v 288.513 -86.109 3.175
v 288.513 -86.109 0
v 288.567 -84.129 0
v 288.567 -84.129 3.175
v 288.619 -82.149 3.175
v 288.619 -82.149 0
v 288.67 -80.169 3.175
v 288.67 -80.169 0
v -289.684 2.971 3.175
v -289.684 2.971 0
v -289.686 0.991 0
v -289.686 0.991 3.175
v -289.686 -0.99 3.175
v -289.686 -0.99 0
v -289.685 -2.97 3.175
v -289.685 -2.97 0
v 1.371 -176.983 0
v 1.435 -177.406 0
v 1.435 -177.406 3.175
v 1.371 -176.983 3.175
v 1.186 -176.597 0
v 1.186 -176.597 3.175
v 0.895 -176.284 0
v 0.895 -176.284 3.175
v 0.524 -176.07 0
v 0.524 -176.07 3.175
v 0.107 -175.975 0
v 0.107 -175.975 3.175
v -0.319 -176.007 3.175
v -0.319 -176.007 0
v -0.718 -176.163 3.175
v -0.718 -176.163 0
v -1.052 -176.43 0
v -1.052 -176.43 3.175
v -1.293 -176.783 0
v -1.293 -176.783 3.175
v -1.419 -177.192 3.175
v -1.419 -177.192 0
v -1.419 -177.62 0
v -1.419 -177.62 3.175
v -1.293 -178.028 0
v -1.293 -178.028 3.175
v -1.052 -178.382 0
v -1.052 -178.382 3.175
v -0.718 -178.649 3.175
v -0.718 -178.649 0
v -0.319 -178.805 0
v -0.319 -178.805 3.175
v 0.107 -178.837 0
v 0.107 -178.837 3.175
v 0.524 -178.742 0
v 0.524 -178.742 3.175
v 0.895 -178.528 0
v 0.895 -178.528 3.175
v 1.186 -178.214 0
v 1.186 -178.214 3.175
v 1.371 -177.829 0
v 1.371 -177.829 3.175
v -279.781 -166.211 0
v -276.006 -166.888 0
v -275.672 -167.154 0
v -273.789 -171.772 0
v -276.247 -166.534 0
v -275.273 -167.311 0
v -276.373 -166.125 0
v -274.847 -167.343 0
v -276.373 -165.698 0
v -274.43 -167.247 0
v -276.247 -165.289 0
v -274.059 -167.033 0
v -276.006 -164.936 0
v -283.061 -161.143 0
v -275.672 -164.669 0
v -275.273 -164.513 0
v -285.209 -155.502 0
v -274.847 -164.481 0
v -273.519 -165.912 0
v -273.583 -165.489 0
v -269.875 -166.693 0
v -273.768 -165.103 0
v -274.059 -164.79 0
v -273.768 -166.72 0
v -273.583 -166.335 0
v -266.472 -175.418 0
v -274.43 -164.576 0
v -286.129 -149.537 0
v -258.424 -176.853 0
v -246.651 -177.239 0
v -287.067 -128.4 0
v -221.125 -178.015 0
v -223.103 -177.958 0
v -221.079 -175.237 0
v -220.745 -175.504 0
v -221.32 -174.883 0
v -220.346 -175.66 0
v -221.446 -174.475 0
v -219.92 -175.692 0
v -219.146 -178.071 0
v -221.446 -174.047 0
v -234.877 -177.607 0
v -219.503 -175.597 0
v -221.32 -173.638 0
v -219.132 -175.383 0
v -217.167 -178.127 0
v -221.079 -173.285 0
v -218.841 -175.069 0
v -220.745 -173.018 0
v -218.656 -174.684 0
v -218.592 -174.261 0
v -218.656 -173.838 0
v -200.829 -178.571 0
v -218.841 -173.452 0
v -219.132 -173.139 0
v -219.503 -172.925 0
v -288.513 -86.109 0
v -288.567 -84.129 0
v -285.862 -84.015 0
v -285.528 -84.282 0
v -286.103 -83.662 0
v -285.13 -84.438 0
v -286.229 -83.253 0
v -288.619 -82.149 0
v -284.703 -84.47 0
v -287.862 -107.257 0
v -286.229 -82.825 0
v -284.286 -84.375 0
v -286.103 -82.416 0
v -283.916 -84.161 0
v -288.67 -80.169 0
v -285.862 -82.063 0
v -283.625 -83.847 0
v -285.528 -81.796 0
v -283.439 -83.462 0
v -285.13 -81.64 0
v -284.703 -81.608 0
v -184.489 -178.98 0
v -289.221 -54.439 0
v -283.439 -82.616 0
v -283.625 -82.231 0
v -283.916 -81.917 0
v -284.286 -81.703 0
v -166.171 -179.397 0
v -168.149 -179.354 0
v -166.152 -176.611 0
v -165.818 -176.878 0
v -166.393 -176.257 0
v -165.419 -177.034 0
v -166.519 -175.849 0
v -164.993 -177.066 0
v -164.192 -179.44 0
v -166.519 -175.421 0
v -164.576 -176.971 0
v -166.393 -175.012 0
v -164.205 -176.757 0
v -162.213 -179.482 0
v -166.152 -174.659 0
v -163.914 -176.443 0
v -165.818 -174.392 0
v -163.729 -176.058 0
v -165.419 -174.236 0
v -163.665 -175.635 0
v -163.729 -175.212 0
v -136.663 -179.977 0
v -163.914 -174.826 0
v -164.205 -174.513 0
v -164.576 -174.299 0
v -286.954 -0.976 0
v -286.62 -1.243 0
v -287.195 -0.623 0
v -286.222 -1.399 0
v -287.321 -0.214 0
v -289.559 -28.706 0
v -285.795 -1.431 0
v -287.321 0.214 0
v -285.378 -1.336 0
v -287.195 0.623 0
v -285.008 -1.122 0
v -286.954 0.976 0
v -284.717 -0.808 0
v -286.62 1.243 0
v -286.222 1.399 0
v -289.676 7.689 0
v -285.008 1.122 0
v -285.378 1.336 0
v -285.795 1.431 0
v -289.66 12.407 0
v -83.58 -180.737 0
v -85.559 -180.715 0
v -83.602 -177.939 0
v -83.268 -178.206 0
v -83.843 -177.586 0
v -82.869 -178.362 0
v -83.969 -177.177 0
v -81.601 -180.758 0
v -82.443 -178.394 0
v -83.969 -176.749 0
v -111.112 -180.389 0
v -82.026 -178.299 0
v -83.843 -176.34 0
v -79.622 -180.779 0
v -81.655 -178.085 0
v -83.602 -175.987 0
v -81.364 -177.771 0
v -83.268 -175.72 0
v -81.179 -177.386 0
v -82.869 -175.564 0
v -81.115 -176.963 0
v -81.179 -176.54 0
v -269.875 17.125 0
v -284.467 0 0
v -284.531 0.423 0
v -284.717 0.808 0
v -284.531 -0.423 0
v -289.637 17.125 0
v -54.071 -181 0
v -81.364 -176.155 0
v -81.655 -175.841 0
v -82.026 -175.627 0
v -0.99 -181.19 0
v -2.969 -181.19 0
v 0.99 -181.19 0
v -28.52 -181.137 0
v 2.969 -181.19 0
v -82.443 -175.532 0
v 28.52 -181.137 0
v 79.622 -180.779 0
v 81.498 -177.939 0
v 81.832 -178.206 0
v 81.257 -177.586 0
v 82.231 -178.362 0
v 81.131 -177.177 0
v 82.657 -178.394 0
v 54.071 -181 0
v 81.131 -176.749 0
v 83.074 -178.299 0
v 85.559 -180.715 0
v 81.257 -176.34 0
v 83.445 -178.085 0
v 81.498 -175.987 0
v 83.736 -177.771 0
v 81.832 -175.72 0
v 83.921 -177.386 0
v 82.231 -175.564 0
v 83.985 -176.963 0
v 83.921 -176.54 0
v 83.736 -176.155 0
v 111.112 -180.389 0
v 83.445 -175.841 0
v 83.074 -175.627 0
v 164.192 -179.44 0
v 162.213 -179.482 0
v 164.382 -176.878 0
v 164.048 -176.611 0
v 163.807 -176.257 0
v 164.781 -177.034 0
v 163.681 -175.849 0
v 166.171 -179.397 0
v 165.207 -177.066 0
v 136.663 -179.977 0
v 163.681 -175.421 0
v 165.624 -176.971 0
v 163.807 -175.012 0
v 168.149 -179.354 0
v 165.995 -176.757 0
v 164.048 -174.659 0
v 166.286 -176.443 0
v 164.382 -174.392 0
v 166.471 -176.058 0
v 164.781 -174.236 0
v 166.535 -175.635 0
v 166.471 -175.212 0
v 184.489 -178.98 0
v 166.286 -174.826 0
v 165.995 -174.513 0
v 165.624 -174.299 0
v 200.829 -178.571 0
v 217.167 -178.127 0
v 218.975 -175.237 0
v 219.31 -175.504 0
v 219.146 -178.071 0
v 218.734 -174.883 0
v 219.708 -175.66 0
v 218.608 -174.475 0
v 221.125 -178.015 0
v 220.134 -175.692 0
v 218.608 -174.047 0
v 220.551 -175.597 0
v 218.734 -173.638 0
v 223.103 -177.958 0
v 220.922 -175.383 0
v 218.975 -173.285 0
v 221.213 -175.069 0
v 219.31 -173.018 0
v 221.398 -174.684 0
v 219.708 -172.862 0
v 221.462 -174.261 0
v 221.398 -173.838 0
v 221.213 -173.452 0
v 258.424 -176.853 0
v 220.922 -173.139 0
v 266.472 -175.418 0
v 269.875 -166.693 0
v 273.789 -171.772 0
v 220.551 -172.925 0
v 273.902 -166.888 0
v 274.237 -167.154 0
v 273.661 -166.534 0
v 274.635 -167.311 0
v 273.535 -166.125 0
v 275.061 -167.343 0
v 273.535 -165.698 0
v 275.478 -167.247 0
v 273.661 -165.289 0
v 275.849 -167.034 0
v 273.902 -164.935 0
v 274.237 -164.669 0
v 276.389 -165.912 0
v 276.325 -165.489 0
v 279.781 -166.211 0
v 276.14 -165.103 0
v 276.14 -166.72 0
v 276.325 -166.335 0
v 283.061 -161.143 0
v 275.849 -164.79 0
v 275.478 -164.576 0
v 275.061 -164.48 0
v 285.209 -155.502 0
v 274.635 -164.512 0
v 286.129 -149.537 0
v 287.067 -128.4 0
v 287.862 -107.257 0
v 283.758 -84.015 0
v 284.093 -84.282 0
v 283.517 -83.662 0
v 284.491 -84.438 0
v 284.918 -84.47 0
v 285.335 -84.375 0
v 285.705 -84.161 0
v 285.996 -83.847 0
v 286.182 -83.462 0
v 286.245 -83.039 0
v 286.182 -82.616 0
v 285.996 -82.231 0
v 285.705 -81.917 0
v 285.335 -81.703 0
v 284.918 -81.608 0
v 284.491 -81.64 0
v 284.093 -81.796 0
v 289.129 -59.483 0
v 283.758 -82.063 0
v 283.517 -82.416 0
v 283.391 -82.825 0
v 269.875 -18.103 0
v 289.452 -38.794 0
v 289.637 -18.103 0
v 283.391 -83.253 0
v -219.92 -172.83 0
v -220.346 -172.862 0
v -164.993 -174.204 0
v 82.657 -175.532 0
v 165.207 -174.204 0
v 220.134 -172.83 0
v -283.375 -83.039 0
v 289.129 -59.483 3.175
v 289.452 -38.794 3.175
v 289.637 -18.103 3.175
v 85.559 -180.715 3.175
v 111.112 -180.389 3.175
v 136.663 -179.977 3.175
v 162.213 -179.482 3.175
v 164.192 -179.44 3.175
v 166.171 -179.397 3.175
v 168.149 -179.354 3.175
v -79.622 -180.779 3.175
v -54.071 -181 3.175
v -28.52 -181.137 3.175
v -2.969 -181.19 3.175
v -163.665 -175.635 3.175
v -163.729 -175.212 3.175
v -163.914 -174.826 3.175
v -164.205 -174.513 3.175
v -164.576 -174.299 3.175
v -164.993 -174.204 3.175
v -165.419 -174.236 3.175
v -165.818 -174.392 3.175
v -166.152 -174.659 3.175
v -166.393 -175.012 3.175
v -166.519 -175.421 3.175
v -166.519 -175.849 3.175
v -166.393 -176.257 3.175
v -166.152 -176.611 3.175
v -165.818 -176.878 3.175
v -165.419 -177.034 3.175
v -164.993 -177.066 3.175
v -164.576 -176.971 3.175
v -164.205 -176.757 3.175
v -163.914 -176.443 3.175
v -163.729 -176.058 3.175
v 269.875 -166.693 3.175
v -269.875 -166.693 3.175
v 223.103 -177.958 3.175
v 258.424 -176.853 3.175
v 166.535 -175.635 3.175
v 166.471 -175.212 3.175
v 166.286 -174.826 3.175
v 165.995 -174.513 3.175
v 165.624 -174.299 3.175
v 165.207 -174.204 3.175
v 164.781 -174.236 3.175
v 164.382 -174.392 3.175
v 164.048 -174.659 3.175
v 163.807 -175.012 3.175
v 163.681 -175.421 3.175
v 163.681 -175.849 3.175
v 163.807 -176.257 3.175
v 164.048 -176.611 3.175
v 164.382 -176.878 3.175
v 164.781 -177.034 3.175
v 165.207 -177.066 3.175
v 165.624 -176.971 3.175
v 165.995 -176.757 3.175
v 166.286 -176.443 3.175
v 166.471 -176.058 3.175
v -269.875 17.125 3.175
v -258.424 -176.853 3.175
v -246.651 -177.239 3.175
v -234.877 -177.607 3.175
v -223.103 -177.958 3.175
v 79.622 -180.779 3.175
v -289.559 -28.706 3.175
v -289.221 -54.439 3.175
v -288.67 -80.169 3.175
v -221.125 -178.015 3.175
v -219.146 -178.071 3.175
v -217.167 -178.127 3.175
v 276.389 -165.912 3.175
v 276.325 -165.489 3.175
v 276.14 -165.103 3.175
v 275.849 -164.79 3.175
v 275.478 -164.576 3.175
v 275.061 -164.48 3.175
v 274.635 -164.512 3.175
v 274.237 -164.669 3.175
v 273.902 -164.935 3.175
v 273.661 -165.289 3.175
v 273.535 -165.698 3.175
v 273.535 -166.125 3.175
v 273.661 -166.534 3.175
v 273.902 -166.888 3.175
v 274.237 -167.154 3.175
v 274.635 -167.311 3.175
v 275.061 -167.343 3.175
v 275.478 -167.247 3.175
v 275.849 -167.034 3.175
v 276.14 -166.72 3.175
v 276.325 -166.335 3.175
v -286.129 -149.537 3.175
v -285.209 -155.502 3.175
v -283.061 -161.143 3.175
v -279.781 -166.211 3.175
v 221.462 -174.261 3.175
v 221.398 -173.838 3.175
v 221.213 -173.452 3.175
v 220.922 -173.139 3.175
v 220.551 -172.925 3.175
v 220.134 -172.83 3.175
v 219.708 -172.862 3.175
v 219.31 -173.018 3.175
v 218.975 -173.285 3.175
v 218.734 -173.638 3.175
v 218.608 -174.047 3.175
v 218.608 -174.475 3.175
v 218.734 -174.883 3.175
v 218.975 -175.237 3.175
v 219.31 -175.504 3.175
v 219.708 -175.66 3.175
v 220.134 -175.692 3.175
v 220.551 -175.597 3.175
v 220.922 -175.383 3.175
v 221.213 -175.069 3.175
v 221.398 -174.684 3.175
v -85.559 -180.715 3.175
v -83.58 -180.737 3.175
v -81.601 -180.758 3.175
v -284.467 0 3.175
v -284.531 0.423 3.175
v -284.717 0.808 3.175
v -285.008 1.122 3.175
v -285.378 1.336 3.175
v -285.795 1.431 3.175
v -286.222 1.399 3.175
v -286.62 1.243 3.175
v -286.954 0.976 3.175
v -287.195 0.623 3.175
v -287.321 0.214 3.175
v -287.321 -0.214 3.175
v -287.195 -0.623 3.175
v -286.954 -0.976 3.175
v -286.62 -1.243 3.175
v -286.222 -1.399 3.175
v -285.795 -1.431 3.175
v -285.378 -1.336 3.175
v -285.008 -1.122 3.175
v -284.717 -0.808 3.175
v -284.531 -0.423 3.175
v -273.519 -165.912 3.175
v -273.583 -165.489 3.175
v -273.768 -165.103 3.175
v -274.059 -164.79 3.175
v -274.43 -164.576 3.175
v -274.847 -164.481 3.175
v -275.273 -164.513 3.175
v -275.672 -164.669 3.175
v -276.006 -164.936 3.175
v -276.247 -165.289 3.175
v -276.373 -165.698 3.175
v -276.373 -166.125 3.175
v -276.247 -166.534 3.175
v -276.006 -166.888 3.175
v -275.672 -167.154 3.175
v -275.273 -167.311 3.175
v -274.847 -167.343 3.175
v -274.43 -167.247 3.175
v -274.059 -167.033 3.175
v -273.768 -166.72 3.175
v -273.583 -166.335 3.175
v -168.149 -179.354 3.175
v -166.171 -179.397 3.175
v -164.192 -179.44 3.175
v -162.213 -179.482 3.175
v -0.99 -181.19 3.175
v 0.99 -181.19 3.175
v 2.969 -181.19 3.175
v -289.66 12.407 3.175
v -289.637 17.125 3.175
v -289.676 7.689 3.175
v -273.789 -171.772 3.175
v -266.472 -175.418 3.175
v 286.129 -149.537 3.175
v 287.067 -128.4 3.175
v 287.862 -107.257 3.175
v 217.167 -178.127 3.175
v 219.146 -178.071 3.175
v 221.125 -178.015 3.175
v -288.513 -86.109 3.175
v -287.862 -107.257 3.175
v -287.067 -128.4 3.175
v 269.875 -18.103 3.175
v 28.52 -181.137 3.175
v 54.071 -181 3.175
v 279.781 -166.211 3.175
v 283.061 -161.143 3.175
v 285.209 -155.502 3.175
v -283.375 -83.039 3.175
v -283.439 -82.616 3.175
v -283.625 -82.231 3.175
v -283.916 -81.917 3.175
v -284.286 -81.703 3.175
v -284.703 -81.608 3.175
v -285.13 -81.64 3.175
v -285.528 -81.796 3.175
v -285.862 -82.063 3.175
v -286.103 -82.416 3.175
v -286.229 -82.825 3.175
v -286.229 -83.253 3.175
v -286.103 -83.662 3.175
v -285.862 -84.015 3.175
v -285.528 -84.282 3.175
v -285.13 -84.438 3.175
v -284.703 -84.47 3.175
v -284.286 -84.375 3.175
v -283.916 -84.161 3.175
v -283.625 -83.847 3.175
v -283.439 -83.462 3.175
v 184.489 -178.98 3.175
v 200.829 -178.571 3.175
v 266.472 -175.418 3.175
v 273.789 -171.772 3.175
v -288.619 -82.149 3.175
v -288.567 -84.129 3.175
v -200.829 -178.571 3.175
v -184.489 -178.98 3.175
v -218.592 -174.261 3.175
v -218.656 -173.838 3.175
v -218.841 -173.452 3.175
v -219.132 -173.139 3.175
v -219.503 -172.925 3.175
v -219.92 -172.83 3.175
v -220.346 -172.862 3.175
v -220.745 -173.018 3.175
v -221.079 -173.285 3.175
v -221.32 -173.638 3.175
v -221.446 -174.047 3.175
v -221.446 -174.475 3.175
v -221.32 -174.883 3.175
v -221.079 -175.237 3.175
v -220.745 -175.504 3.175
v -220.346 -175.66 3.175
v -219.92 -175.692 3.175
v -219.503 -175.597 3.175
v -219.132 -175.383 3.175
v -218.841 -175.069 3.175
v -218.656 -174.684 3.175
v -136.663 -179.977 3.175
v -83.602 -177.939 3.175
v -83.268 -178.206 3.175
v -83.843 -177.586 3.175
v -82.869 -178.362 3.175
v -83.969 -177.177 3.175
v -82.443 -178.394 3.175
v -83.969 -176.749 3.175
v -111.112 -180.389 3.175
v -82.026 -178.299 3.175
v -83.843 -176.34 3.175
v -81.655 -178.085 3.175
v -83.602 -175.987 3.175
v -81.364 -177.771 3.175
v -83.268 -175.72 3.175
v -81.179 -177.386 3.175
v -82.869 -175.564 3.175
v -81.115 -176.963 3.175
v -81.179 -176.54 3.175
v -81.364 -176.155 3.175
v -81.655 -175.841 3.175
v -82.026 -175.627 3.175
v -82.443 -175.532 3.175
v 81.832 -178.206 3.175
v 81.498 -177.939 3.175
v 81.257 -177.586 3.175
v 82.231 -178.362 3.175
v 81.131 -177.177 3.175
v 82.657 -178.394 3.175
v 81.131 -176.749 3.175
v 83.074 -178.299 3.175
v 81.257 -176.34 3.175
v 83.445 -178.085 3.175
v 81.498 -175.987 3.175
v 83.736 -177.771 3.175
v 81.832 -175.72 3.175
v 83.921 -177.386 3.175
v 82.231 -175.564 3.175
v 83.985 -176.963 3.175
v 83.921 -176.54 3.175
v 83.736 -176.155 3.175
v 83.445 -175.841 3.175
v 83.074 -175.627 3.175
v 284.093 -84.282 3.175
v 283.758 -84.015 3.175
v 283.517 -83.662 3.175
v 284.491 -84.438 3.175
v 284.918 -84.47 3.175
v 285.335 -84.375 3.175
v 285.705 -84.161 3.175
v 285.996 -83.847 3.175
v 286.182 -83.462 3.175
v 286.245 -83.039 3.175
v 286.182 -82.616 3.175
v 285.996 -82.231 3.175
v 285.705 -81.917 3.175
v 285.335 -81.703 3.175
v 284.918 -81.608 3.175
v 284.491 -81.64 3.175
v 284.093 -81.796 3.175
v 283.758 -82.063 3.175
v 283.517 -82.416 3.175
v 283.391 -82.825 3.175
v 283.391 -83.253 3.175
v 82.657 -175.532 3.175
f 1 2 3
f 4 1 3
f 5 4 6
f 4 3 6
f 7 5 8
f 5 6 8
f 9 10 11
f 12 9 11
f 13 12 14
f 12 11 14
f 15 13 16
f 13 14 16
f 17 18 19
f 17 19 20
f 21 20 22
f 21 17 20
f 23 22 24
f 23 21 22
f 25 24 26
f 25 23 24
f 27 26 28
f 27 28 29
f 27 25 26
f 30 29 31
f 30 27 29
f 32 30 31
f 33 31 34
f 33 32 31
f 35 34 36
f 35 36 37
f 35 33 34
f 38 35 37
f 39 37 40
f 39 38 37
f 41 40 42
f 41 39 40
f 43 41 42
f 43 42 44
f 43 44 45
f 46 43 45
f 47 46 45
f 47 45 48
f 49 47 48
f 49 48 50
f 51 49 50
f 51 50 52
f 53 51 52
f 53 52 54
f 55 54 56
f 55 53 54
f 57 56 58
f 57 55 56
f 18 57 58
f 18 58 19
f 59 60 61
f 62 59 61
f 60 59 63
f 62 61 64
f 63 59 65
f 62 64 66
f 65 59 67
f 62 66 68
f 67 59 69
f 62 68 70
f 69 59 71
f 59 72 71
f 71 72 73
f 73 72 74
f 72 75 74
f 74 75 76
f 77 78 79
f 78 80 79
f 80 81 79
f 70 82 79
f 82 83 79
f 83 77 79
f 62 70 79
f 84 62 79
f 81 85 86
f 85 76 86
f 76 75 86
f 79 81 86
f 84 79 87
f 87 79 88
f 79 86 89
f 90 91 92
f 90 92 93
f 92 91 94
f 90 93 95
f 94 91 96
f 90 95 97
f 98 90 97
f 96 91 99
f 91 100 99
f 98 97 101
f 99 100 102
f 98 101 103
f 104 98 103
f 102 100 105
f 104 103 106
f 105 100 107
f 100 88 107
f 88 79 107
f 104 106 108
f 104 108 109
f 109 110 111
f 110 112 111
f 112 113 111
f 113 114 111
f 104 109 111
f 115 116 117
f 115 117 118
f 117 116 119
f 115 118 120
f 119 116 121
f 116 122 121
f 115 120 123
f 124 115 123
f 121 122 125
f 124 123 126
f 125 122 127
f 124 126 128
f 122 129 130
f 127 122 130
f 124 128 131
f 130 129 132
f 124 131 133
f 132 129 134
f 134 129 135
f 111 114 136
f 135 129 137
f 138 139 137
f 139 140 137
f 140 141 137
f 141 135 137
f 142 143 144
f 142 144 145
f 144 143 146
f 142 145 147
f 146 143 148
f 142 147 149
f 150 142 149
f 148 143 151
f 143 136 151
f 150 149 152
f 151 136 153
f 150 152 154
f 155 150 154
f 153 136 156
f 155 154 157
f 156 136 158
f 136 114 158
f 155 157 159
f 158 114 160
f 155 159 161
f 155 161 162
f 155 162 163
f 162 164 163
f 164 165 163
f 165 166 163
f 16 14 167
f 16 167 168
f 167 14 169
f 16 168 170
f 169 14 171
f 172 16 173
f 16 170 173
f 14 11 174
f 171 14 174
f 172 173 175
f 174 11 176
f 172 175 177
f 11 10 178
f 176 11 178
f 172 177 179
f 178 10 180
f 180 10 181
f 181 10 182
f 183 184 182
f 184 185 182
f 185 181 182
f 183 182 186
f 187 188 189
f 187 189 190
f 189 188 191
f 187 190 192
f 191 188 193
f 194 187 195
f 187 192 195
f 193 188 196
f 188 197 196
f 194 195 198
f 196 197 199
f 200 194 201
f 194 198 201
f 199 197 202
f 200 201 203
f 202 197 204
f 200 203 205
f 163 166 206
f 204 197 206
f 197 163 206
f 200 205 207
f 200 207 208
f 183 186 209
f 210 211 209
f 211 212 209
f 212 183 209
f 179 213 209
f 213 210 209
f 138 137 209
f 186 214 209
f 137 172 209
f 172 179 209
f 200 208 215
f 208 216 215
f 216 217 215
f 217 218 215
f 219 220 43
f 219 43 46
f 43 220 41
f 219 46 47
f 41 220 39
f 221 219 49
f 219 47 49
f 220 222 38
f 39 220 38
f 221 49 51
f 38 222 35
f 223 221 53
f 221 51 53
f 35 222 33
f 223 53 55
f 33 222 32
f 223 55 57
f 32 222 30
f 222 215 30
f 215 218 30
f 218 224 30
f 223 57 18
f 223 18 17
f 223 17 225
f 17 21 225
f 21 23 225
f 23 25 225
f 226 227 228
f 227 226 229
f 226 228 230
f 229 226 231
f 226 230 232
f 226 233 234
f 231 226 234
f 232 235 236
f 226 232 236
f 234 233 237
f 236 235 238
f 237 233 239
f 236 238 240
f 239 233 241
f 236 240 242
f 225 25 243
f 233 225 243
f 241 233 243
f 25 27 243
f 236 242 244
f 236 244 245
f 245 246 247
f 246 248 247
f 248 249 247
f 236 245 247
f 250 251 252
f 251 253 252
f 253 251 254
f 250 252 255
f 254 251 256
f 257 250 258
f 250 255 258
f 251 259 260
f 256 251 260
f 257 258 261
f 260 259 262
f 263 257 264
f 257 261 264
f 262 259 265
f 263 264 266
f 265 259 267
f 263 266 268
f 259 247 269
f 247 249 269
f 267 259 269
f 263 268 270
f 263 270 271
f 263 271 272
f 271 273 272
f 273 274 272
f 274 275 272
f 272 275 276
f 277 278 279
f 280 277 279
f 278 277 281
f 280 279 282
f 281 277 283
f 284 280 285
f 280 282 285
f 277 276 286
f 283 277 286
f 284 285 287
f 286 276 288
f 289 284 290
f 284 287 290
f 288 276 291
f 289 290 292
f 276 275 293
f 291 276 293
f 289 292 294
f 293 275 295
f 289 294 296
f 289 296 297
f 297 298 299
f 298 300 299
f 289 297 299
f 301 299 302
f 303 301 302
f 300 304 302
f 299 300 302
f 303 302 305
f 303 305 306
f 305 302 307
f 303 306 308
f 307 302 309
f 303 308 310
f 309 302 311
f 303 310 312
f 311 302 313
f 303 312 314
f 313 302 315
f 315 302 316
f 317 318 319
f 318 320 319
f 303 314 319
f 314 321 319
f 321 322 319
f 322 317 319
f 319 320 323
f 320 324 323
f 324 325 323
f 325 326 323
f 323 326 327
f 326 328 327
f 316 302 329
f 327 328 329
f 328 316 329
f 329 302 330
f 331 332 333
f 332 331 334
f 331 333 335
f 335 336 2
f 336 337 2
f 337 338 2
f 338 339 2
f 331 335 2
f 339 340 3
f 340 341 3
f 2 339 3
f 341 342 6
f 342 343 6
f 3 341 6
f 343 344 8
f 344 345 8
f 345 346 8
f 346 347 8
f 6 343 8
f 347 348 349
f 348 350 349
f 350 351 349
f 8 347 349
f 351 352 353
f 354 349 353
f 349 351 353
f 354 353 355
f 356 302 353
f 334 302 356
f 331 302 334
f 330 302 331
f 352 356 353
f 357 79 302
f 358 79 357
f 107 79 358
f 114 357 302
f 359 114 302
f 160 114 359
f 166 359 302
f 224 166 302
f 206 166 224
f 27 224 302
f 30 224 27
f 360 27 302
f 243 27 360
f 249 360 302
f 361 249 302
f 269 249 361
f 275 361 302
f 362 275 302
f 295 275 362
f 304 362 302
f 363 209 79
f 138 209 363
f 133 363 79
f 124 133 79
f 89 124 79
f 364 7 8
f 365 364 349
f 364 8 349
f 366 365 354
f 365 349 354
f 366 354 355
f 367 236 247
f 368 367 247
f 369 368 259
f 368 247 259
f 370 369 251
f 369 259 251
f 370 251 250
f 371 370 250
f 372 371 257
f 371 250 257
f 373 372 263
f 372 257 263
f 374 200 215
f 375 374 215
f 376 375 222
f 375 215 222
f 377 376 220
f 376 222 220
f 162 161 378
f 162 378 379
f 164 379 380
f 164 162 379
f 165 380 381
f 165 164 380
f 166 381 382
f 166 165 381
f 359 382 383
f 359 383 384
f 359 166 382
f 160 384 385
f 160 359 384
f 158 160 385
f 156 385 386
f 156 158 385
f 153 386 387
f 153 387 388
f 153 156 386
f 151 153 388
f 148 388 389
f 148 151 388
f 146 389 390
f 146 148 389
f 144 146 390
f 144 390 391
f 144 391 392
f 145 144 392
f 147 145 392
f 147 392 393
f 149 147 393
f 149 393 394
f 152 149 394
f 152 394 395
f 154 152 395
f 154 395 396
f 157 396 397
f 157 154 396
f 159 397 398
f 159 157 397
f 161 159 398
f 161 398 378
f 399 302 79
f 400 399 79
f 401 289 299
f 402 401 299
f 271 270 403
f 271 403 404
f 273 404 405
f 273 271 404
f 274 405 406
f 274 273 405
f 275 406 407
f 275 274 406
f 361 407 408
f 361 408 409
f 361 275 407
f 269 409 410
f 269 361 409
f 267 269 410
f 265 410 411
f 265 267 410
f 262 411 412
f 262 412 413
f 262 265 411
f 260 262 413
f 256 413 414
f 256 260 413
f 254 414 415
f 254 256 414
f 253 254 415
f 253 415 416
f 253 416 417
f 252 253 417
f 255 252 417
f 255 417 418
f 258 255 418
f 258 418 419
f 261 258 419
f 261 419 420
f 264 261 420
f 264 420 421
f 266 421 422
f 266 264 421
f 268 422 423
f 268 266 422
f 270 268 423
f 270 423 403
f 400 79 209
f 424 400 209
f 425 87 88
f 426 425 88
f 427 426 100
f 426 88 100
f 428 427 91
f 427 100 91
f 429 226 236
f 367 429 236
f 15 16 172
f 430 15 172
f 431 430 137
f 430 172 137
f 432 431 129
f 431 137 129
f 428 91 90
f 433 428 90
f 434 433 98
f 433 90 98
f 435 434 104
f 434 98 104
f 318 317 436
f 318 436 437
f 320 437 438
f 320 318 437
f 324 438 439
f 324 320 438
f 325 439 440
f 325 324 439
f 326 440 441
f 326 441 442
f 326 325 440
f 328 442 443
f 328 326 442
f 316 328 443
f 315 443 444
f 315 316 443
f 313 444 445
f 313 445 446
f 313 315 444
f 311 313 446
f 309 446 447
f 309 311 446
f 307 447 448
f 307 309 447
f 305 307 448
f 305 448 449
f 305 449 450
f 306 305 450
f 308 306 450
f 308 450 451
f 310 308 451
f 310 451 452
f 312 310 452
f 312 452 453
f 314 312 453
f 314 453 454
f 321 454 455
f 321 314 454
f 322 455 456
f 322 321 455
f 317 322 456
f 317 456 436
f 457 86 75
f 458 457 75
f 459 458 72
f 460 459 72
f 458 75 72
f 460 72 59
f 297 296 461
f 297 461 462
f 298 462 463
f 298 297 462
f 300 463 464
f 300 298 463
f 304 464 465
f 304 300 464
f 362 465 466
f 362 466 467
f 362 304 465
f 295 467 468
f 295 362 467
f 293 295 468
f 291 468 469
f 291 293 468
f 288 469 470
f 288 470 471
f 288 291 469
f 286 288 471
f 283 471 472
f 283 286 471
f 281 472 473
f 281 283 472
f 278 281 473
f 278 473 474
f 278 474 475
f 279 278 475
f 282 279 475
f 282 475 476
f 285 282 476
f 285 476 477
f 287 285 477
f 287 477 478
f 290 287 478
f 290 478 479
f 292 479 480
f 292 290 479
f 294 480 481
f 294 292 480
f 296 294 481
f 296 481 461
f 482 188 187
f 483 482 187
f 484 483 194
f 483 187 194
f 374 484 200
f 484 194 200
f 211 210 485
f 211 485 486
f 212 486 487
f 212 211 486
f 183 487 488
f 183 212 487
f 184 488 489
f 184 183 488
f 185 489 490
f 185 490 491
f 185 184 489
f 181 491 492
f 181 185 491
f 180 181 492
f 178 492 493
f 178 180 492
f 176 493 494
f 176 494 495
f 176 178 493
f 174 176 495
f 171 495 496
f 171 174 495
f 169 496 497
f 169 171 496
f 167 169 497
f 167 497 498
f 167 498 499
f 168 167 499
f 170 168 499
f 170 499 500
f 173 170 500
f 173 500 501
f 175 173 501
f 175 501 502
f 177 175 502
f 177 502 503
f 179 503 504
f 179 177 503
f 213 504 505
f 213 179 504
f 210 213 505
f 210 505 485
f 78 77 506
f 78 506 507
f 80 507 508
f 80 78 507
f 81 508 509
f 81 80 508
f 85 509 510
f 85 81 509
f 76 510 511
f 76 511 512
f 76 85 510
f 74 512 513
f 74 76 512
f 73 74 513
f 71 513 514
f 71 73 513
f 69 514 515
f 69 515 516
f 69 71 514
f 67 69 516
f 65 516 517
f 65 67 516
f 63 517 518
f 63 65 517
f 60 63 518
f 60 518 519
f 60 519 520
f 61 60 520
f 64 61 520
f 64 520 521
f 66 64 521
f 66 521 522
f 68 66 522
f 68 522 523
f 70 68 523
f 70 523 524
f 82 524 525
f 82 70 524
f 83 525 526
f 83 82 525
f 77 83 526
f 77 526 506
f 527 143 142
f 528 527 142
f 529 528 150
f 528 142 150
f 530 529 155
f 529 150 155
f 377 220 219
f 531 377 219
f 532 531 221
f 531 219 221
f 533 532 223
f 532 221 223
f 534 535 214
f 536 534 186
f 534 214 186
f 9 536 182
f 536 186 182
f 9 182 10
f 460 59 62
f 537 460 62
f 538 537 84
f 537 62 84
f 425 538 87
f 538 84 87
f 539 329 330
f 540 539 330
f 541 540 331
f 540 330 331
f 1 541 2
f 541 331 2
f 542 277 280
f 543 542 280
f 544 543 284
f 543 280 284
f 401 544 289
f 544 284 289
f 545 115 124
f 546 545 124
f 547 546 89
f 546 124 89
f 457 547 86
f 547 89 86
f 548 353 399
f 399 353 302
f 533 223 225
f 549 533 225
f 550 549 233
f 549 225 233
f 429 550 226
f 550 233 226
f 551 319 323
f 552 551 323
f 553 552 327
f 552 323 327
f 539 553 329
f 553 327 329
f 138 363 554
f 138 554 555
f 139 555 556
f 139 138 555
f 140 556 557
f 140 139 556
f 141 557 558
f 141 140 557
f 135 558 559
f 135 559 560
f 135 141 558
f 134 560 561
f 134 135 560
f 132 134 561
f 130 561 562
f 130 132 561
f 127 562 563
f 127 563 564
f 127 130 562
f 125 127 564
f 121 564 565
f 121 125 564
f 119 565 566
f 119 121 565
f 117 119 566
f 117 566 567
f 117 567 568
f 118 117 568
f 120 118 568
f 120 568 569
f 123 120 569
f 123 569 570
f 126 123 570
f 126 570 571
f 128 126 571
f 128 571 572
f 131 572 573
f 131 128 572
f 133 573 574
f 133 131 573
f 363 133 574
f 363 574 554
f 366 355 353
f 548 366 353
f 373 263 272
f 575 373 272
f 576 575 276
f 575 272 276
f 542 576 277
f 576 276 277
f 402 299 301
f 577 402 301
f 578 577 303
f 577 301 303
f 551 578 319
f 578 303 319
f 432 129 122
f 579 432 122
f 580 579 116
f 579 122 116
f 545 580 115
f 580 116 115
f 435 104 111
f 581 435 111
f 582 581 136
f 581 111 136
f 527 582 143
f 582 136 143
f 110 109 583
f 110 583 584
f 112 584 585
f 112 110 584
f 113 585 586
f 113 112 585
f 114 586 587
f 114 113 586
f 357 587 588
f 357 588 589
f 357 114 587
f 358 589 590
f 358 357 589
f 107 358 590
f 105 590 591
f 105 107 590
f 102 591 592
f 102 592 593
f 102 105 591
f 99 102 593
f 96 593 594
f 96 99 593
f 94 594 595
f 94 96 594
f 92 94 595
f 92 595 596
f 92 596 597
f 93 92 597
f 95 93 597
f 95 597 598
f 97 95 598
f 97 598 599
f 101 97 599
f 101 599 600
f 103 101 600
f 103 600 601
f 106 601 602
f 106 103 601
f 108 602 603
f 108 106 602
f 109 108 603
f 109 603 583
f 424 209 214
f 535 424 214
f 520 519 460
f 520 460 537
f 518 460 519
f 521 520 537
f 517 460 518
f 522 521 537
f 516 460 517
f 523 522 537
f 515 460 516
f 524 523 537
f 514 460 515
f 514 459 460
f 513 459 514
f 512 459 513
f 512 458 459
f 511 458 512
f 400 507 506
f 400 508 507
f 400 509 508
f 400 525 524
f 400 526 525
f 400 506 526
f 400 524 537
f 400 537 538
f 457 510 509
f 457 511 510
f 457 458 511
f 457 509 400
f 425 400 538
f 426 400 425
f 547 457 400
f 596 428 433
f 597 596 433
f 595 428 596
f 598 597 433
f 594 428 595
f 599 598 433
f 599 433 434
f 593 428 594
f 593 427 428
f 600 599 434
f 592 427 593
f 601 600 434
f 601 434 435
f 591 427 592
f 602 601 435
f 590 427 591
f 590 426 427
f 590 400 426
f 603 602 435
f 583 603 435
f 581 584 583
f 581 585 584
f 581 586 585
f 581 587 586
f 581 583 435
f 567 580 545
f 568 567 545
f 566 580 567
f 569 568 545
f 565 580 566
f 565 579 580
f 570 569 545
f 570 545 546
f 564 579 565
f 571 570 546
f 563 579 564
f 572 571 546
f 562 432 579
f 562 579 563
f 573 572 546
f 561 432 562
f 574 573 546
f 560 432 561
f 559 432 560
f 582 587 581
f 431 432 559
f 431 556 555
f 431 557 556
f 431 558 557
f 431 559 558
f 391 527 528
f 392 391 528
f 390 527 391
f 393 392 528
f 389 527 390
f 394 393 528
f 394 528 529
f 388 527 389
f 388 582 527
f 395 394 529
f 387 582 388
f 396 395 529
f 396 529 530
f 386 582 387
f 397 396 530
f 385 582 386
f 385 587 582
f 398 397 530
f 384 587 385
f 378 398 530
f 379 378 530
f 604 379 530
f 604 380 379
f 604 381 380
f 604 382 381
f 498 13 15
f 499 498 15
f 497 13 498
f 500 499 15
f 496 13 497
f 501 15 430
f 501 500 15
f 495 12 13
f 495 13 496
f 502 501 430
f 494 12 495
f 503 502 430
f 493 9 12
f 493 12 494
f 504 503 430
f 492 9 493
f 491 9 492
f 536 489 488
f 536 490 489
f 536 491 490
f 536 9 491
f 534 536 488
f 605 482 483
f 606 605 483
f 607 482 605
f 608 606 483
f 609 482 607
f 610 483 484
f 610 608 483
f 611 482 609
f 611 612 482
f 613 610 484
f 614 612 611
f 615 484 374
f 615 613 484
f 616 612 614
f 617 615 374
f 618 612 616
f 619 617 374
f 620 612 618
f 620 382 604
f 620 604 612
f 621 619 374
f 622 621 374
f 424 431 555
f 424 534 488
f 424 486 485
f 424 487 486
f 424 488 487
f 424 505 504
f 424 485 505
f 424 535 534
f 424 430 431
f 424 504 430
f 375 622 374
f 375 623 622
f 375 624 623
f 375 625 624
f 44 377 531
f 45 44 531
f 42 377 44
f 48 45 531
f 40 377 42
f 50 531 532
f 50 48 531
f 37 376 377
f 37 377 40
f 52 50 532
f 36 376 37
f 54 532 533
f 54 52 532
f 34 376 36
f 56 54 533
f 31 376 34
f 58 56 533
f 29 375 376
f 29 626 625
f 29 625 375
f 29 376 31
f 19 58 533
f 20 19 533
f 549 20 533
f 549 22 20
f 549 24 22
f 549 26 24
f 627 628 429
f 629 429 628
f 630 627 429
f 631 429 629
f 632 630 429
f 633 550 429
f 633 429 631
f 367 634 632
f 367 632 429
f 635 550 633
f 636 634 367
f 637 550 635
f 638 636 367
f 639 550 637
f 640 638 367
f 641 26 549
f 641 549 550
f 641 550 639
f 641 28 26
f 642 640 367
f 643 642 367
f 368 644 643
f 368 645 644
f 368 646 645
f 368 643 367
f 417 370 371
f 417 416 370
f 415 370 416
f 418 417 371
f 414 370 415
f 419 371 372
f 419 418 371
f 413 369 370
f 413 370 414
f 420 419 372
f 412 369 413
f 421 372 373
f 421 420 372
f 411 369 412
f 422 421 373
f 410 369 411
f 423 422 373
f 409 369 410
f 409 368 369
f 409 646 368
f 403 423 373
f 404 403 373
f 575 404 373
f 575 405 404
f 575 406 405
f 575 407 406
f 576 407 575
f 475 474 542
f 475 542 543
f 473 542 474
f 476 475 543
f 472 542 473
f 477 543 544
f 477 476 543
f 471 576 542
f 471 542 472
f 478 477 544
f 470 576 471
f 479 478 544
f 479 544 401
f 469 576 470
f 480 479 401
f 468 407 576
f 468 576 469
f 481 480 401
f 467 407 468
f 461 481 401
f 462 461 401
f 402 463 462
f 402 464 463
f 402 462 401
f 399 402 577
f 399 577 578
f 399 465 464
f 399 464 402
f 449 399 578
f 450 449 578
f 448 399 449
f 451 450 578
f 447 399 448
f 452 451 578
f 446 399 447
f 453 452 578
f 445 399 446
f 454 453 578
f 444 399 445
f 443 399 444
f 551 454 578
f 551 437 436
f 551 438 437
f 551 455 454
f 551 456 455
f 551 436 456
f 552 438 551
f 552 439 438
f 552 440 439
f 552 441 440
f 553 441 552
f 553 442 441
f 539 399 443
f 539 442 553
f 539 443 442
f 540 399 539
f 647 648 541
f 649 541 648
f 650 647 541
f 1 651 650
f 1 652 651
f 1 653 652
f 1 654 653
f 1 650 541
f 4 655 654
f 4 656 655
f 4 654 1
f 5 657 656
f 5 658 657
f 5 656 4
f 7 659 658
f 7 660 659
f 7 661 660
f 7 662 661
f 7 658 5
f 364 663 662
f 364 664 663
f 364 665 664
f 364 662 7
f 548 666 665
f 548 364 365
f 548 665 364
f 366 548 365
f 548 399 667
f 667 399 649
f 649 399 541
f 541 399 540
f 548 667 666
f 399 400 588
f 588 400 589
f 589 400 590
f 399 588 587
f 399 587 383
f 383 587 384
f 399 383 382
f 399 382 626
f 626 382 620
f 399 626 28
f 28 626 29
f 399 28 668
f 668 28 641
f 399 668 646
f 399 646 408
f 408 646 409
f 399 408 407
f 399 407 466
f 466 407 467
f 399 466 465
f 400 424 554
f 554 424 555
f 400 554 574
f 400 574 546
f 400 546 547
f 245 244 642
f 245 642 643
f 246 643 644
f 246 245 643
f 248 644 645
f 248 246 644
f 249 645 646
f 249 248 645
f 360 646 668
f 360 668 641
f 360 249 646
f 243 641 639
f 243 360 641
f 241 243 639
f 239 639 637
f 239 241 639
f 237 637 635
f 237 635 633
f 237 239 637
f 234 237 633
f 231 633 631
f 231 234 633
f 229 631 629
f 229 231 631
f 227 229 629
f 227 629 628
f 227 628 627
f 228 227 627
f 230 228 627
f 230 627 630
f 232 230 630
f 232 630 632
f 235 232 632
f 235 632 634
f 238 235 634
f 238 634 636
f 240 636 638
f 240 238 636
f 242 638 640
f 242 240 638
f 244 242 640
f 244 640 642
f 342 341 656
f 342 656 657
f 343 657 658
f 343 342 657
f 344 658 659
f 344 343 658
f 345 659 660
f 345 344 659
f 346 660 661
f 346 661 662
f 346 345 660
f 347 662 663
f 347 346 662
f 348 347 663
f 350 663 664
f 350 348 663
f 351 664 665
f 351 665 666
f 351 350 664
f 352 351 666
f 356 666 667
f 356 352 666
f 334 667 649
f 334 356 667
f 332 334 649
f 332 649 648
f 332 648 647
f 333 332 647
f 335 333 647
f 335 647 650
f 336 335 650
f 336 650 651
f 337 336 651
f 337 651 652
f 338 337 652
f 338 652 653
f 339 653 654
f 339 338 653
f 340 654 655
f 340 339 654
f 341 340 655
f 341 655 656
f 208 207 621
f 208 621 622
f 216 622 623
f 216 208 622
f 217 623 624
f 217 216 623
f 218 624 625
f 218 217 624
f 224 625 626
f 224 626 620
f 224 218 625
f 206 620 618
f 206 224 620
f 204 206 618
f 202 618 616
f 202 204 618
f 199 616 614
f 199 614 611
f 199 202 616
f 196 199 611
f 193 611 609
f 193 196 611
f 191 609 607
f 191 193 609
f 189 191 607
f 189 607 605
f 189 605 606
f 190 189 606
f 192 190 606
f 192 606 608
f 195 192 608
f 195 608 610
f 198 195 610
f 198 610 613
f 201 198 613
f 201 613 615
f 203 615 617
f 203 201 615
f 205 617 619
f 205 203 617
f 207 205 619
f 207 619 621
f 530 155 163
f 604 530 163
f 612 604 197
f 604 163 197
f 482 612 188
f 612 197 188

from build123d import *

# Parameters (mm, degrees)
SKETCH1_R           = 1.435
SKETCH1_R_2         = 1.4351
BOSS_EXTRUDE1_DEPTH = 3.175
SKETCH2_W           = 534.158263194
SKETCH2_H           = 314.627770006
SKETCH2_R           = 1.4351
CUT_EXTRUDE1_DEPTH  = 342.698968356
CUT_EXTRUDE2_DEPTH  = 342.698968356


with BuildPart() as part:
    # Sketch1 → Boss-Extrude1 (new body)
    with BuildSketch(Plane.XY):
        with BuildLine():
            ThreePointArc((2.968751211, -181.189695026), (41.295889155, -181.079537948), (79.6220041, -180.778621425))
            Line((79.6220041, -180.778621425), (85.559165015, -180.714940362))
            ThreePointArc((85.559165015, -180.714940362), (123.887667874, -180.193645916), (162.213100977, -179.481566675))
            ThreePointArc((162.213100977, -179.481566675), (165.18118139, -179.418457741), (168.149237253, -179.35420455))
            ThreePointArc((168.149237253, -179.35420455), (192.659124698, -178.779845314), (217.167059321, -178.127456184))
            ThreePointArc((217.167059321, -178.127456184), (220.135246662, -178.043143258), (223.103401271, -177.957685792))
            Line((223.103401271, -177.957685792), (258.423629847, -176.852835003))
            ThreePointArc((258.423629847, -176.852835003), (267.290868319, -175.133004675), (275.18450496, -170.742533734))
            ThreePointArc((275.18450496, -170.742533734), (277.610750544, -168.6061656), (279.781359306, -166.210504095))
            ThreePointArc((279.781359306, -166.210504095), (284.283709644, -158.379432473), (286.129131597, -149.53685032))
            ThreePointArc((286.129131597, -149.53685032), (287.482131945, -117.828809116), (288.512976487, -86.108660213))
            ThreePointArc((288.512976487, -86.108660213), (288.592974065, -83.139049998), (288.670148028, -80.169365063))
            ThreePointArc((288.670148028, -80.169365063), (289.416235277, -41.572865854), (289.685382101, -2.970094485))
            ThreePointArc((289.685382101, -2.970094485), (289.686328933, 0.0005929), (289.684451162, 2.971279842))
            ThreePointArc((289.684451162, 2.971279842), (289.409759592, 41.084465923), (288.670148028, 79.191465063))
            ThreePointArc((288.670148028, 79.191465063), (288.592974065, 82.161149998), (288.512976487, 85.130760213))
            ThreePointArc((288.512976487, 85.130760213), (287.482131945, 116.850909116), (286.129131597, 148.55895032))
            ThreePointArc((286.129131597, 148.55895032), (284.283709644, 157.401532473), (279.781359306, 165.232604095))
            ThreePointArc((279.781359306, 165.232604095), (277.610750544, 167.6282656), (275.18450496, 169.764633734))
            ThreePointArc((275.18450496, 169.764633734), (267.290868319, 174.155104675), (258.423629847, 175.874935003))
            ThreePointArc((258.423629847, 175.874935003), (240.76414932, 176.447620699), (223.103401271, 176.979785792))
            ThreePointArc((223.103401271, 176.979785792), (220.135246662, 177.065243258), (217.167059321, 177.149556184))
            ThreePointArc((217.167059321, 177.149556184), (192.659124698, 177.801945314), (168.149237253, 178.37630455))
            ThreePointArc((168.149237253, 178.37630455), (165.18118139, 178.440557741), (162.213100977, 178.503666675))
            ThreePointArc((162.213100977, 178.503666675), (123.887667874, 179.215745916), (85.559165015, 179.737040362))
            ThreePointArc((85.559165015, 179.737040362), (82.590590695, 179.769453121), (79.6220041, 179.800721425))
            ThreePointArc((79.6220041, 179.800721425), (41.295889155, 180.101637948), (2.968751211, 180.211795026))
            ThreePointArc((2.968751211, 180.211795026), (0, 180.212367286), (-2.968751211, 180.211795026))
            ThreePointArc((-2.968751211, 180.211795026), (-41.295889155, 180.101637948), (-79.6220041, 179.800721425))
            ThreePointArc((-79.6220041, 179.800721425), (-82.590590695, 179.769453121), (-85.559165015, 179.737040362))
            ThreePointArc((-85.559165015, 179.737040362), (-123.887667874, 179.215745916), (-162.213100977, 178.503666675))
            ThreePointArc((-162.213100977, 178.503666675), (-165.18118139, 178.440557741), (-168.149237253, 178.37630455))
            ThreePointArc((-168.149237253, 178.37630455), (-192.659124698, 177.801945314), (-217.167059321, 177.149556184))
            ThreePointArc((-217.167059321, 177.149556184), (-220.135246662, 177.065243258), (-223.103401271, 176.979785792))
            ThreePointArc((-223.103401271, 176.979785792), (-240.76414932, 176.447620699), (-258.423629847, 175.874935003))
            ThreePointArc((-258.423629847, 175.874935003), (-267.290868319, 174.155104675), (-275.18450496, 169.764633734))
            ThreePointArc((-275.18450496, 169.764633734), (-277.610750544, 167.6282656), (-279.781359306, 165.232604095))
            ThreePointArc((-279.781359306, 165.232604095), (-284.283709644, 157.401532473), (-286.129131597, 148.55895032))
            ThreePointArc((-286.129131597, 148.55895032), (-287.482131945, 116.850909116), (-288.512976487, 85.130760213))
            ThreePointArc((-288.512976487, 85.130760213), (-288.592974065, 82.161149998), (-288.670148028, 79.191465063))
            ThreePointArc((-288.670148028, 79.191465063), (-289.409759592, 41.084465923), (-289.684451162, 2.971279842))
            ThreePointArc((-289.684451162, 2.971279842), (-289.686328933, 0.0005929), (-289.685382101, -2.970094485))
            ThreePointArc((-289.685382101, -2.970094485), (-289.416235277, -41.572865854), (-288.670148028, -80.169365063))
            ThreePointArc((-288.670148028, -80.169365063), (-288.592974065, -83.139049998), (-288.512976487, -86.108660213))
            ThreePointArc((-288.512976487, -86.108660213), (-287.482131945, -117.828809116), (-286.129131597, -149.53685032))
            ThreePointArc((-286.129131597, -149.53685032), (-284.283709644, -158.379432473), (-279.781359306, -166.210504095))
            ThreePointArc((-279.781359306, -166.210504095), (-277.610750544, -168.6061656), (-275.18450496, -170.742533734))
            ThreePointArc((-275.18450496, -170.742533734), (-267.290868319, -175.133004675), (-258.423629847, -176.852835003))
            ThreePointArc((-258.423629847, -176.852835003), (-240.76414932, -177.425520699), (-223.103401271, -177.957685792))
            ThreePointArc((-223.103401271, -177.957685792), (-220.135246662, -178.043143258), (-217.167059321, -178.127456184))
            ThreePointArc((-217.167059321, -178.127456184), (-192.659124698, -178.779845314), (-168.149237253, -179.35420455))
            ThreePointArc((-168.149237253, -179.35420455), (-165.18118139, -179.418457741), (-162.213100977, -179.481566675))
            ThreePointArc((-162.213100977, -179.481566675), (-123.887667874, -180.193645916), (-85.559165015, -180.714940362))
            ThreePointArc((-85.559165015, -180.714940362), (-82.590590695, -180.747353121), (-79.6220041, -180.778621425))
            ThreePointArc((-79.6220041, -180.778621425), (-41.295889155, -181.079537948), (-2.968751211, -181.189695026))
            ThreePointArc((-2.968751211, -181.189695026), (0, -181.190267286), (2.968751211, -181.189695026))
        make_face()
        with Locations((-274.954150451, -165.911566346)):
            Circle(SKETCH1_R, mode=Mode.SUBTRACT)
        with Locations((-220.027075225, -174.260724966)):
            Circle(SKETCH1_R_2, mode=Mode.SUBTRACT)
        with Locations((-165.1, -175.63472853)):
            Circle(SKETCH1_R_2, mode=Mode.SUBTRACT)
        with Locations((-82.55, -176.962970799)):
            Circle(SKETCH1_R_2, mode=Mode.SUBTRACT)
        with Locations((0, -177.405667286)):
            Circle(SKETCH1_R_2, mode=Mode.SUBTRACT)
        with Locations((-284.81033356, -83.03895)):
            Circle(SKETCH1_R_2, mode=Mode.SUBTRACT)
        with Locations((82.55, -176.962970799)):
            Circle(SKETCH1_R_2, mode=Mode.SUBTRACT)
        with Locations((165.1, -175.63472853)):
            Circle(SKETCH1_R_2, mode=Mode.SUBTRACT)
        with Locations((220.027075225, -174.260724966)):
            Circle(SKETCH1_R_2, mode=Mode.SUBTRACT)
        with Locations((274.954150451, -165.911566346)):
            Circle(SKETCH1_R_2, mode=Mode.SUBTRACT)
        with Locations((284.81033356, -83.03895)):
            Circle(SKETCH1_R_2, mode=Mode.SUBTRACT)
        with Locations((-285.902364234, 0)):
            Circle(SKETCH1_R_2, mode=Mode.SUBTRACT)
        with Locations((-284.81033356, 82.06105)):
            Circle(SKETCH1_R_2, mode=Mode.SUBTRACT)
        with Locations((-274.954150451, 164.933666346)):
            Circle(SKETCH1_R_2, mode=Mode.SUBTRACT)
        with Locations((-220.027075225, 173.282824966)):
            Circle(SKETCH1_R_2, mode=Mode.SUBTRACT)
        with Locations((-165.1, 174.65682853)):
            Circle(SKETCH1_R_2, mode=Mode.SUBTRACT)
        with Locations((-82.55, 175.985070799)):
            Circle(SKETCH1_R_2, mode=Mode.SUBTRACT)
        with Locations((0, 176.427767286)):
            Circle(SKETCH1_R_2, mode=Mode.SUBTRACT)
        with Locations((285.902364234, 0)):
            Circle(SKETCH1_R_2, mode=Mode.SUBTRACT)
        with Locations((284.81033356, 82.06105)):
            Circle(SKETCH1_R_2, mode=Mode.SUBTRACT)
        with Locations((82.55, 175.985070799)):
            Circle(SKETCH1_R_2, mode=Mode.SUBTRACT)
        with Locations((165.1, 174.65682853)):
            Circle(SKETCH1_R_2, mode=Mode.SUBTRACT)
        with Locations((220.027075225, 173.282824966)):
            Circle(SKETCH1_R_2, mode=Mode.SUBTRACT)
        with Locations((274.954150451, 164.933666346)):
            Circle(SKETCH1_R_2, mode=Mode.SUBTRACT)
    extrude(amount=BOSS_EXTRUDE1_DEPTH)

    # Sketch2 → Cut-Extrude1 (cut, through all)
    # profile 1 of 3: a face of its own
    with BuildSketch(Plane(origin=(0, 0, 0), x_dir=(-1, 0, 0), z_dir=(0, 0, -1))):
        with Locations((0, -0.48895)):
            Rectangle(SKETCH2_W, SKETCH2_H)
    # profile 2 of 3: a face of its own
    with BuildSketch(Plane(origin=(0, 0, 0), x_dir=(-1, 0, 0), z_dir=(0, 0, -1))):
        with BuildLine():
            Line((267.079131597, 156.824935003), (267.079131597, 17.124935003))
            Line((267.079131597, 17.124935003), (289.636716357, 17.124935003))
            ThreePointArc((289.636716357, 17.124935003), (288.574391594, 82.860395885), (286.129131597, 148.55895032))
            ThreePointArc((286.129131597, 148.55895032), (277.611193872, 167.627828514), (258.423629847, 175.874935003))
            ThreePointArc((258.423629847, 175.874935003), (0, 180.212367286), (-258.423629847, 175.874935003))
            ThreePointArc((-258.423629847, 175.874935003), (-277.611193872, 167.627828514), (-286.129131597, 148.55895032))
            ThreePointArc((-286.129131597, 148.55895032), (-288.994653482, 65.251455257), (-289.636716357, -18.102835003))
            Line((-289.636716357, -18.102835003), (-267.079131597, -18.102835003))
            Line((-267.079131597, -18.102835003), (-267.079131597, 156.824935003))
            Line((-267.079131597, 156.824935003), (267.079131597, 156.824935003))
        make_face()
        with Locations((-285.902364234, 0)):
            Circle(SKETCH2_R, mode=Mode.SUBTRACT)
        with Locations((-284.81033356, 82.06105)):
            Circle(SKETCH2_R, mode=Mode.SUBTRACT)
        with Locations((-274.954150451, 164.933666346)):
            Circle(SKETCH2_R, mode=Mode.SUBTRACT)
        with Locations((-220.027075225, 173.282824966)):
            Circle(SKETCH2_R, mode=Mode.SUBTRACT)
        with Locations((-165.1, 174.65682853)):
            Circle(SKETCH2_R, mode=Mode.SUBTRACT)
        with Locations((-82.55, 175.985070799)):
            Circle(SKETCH2_R, mode=Mode.SUBTRACT)
        with Locations((284.81033356, 82.06105)):
            Circle(SKETCH2_R, mode=Mode.SUBTRACT)
        with Locations((0, 176.427767286)):
            Circle(SKETCH2_R, mode=Mode.SUBTRACT)
        with Locations((82.55, 175.985070799)):
            Circle(SKETCH2_R, mode=Mode.SUBTRACT)
        with Locations((274.954150451, 164.933666346)):
            Circle(SKETCH2_R, mode=Mode.SUBTRACT)
        with Locations((165.1, 174.65682853)):
            Circle(SKETCH2_R, mode=Mode.SUBTRACT)
        with Locations((220.027075225, 173.282824966)):
            Circle(SKETCH2_R, mode=Mode.SUBTRACT)
    # profile 3 of 3: a face of its own
    with BuildSketch(Plane(origin=(0, 0, 0), x_dir=(-1, 0, 0), z_dir=(0, 0, -1))):
        with BuildLine():
            ThreePointArc((286.129131597, 148.55895032), (288.574391594, 82.860395885), (289.636716357, 17.124935003))
            Line((289.636716357, 17.124935003), (305.179131597, 17.124935003))
            Line((305.179131597, 17.124935003), (305.179131597, 212.688590186))
            Line((305.179131597, 212.688590186), (-305.179131597, 212.688590186))
            Line((-305.179131597, 212.688590186), (-305.179131597, -18.102835003))
            Line((-305.179131597, -18.102835003), (-289.636716357, -18.102835003))
            ThreePointArc((-289.636716357, -18.102835003), (-288.994653482, 65.251455257), (-286.129131597, 148.55895032))
            ThreePointArc((-286.129131597, 148.55895032), (-277.611193872, 167.627828514), (-258.423629847, 175.874935003))
            ThreePointArc((-258.423629847, 175.874935003), (0, 180.212367286), (258.423629847, 175.874935003))
            ThreePointArc((258.423629847, 175.874935003), (277.611193872, 167.627828514), (286.129131597, 148.55895032))
        make_face()
    extrude(amount=-CUT_EXTRUDE1_DEPTH, mode=Mode.SUBTRACT)

    # Sketch3 → Cut-Extrude2 (cut, through all)
    with BuildSketch(Plane(origin=(0, 0, 0), x_dir=(-1, 0, 0), z_dir=(0, 0, -1))):
        Polygon((-269.875, 17.124935003), (-269.875, -18.102835003), (-267.079131597, -18.102835003), (-267.079131597, -157.802835003), (267.079131597, -157.802835003), (267.079131597, 17.124935003), align=None)
        Polygon((-269.875, -166.692835003), (269.875, -166.692835003), (269.875, 17.124935003), (267.079131597, 17.124935003), (267.079131597, -157.802835003), (-267.079131597, -157.802835003), (-267.079131597, -18.102835003), (-269.875, -18.102835003), align=None)
    extrude(amount=-CUT_EXTRUDE2_DEPTH, mode=Mode.SUBTRACT)


solid = part.part
